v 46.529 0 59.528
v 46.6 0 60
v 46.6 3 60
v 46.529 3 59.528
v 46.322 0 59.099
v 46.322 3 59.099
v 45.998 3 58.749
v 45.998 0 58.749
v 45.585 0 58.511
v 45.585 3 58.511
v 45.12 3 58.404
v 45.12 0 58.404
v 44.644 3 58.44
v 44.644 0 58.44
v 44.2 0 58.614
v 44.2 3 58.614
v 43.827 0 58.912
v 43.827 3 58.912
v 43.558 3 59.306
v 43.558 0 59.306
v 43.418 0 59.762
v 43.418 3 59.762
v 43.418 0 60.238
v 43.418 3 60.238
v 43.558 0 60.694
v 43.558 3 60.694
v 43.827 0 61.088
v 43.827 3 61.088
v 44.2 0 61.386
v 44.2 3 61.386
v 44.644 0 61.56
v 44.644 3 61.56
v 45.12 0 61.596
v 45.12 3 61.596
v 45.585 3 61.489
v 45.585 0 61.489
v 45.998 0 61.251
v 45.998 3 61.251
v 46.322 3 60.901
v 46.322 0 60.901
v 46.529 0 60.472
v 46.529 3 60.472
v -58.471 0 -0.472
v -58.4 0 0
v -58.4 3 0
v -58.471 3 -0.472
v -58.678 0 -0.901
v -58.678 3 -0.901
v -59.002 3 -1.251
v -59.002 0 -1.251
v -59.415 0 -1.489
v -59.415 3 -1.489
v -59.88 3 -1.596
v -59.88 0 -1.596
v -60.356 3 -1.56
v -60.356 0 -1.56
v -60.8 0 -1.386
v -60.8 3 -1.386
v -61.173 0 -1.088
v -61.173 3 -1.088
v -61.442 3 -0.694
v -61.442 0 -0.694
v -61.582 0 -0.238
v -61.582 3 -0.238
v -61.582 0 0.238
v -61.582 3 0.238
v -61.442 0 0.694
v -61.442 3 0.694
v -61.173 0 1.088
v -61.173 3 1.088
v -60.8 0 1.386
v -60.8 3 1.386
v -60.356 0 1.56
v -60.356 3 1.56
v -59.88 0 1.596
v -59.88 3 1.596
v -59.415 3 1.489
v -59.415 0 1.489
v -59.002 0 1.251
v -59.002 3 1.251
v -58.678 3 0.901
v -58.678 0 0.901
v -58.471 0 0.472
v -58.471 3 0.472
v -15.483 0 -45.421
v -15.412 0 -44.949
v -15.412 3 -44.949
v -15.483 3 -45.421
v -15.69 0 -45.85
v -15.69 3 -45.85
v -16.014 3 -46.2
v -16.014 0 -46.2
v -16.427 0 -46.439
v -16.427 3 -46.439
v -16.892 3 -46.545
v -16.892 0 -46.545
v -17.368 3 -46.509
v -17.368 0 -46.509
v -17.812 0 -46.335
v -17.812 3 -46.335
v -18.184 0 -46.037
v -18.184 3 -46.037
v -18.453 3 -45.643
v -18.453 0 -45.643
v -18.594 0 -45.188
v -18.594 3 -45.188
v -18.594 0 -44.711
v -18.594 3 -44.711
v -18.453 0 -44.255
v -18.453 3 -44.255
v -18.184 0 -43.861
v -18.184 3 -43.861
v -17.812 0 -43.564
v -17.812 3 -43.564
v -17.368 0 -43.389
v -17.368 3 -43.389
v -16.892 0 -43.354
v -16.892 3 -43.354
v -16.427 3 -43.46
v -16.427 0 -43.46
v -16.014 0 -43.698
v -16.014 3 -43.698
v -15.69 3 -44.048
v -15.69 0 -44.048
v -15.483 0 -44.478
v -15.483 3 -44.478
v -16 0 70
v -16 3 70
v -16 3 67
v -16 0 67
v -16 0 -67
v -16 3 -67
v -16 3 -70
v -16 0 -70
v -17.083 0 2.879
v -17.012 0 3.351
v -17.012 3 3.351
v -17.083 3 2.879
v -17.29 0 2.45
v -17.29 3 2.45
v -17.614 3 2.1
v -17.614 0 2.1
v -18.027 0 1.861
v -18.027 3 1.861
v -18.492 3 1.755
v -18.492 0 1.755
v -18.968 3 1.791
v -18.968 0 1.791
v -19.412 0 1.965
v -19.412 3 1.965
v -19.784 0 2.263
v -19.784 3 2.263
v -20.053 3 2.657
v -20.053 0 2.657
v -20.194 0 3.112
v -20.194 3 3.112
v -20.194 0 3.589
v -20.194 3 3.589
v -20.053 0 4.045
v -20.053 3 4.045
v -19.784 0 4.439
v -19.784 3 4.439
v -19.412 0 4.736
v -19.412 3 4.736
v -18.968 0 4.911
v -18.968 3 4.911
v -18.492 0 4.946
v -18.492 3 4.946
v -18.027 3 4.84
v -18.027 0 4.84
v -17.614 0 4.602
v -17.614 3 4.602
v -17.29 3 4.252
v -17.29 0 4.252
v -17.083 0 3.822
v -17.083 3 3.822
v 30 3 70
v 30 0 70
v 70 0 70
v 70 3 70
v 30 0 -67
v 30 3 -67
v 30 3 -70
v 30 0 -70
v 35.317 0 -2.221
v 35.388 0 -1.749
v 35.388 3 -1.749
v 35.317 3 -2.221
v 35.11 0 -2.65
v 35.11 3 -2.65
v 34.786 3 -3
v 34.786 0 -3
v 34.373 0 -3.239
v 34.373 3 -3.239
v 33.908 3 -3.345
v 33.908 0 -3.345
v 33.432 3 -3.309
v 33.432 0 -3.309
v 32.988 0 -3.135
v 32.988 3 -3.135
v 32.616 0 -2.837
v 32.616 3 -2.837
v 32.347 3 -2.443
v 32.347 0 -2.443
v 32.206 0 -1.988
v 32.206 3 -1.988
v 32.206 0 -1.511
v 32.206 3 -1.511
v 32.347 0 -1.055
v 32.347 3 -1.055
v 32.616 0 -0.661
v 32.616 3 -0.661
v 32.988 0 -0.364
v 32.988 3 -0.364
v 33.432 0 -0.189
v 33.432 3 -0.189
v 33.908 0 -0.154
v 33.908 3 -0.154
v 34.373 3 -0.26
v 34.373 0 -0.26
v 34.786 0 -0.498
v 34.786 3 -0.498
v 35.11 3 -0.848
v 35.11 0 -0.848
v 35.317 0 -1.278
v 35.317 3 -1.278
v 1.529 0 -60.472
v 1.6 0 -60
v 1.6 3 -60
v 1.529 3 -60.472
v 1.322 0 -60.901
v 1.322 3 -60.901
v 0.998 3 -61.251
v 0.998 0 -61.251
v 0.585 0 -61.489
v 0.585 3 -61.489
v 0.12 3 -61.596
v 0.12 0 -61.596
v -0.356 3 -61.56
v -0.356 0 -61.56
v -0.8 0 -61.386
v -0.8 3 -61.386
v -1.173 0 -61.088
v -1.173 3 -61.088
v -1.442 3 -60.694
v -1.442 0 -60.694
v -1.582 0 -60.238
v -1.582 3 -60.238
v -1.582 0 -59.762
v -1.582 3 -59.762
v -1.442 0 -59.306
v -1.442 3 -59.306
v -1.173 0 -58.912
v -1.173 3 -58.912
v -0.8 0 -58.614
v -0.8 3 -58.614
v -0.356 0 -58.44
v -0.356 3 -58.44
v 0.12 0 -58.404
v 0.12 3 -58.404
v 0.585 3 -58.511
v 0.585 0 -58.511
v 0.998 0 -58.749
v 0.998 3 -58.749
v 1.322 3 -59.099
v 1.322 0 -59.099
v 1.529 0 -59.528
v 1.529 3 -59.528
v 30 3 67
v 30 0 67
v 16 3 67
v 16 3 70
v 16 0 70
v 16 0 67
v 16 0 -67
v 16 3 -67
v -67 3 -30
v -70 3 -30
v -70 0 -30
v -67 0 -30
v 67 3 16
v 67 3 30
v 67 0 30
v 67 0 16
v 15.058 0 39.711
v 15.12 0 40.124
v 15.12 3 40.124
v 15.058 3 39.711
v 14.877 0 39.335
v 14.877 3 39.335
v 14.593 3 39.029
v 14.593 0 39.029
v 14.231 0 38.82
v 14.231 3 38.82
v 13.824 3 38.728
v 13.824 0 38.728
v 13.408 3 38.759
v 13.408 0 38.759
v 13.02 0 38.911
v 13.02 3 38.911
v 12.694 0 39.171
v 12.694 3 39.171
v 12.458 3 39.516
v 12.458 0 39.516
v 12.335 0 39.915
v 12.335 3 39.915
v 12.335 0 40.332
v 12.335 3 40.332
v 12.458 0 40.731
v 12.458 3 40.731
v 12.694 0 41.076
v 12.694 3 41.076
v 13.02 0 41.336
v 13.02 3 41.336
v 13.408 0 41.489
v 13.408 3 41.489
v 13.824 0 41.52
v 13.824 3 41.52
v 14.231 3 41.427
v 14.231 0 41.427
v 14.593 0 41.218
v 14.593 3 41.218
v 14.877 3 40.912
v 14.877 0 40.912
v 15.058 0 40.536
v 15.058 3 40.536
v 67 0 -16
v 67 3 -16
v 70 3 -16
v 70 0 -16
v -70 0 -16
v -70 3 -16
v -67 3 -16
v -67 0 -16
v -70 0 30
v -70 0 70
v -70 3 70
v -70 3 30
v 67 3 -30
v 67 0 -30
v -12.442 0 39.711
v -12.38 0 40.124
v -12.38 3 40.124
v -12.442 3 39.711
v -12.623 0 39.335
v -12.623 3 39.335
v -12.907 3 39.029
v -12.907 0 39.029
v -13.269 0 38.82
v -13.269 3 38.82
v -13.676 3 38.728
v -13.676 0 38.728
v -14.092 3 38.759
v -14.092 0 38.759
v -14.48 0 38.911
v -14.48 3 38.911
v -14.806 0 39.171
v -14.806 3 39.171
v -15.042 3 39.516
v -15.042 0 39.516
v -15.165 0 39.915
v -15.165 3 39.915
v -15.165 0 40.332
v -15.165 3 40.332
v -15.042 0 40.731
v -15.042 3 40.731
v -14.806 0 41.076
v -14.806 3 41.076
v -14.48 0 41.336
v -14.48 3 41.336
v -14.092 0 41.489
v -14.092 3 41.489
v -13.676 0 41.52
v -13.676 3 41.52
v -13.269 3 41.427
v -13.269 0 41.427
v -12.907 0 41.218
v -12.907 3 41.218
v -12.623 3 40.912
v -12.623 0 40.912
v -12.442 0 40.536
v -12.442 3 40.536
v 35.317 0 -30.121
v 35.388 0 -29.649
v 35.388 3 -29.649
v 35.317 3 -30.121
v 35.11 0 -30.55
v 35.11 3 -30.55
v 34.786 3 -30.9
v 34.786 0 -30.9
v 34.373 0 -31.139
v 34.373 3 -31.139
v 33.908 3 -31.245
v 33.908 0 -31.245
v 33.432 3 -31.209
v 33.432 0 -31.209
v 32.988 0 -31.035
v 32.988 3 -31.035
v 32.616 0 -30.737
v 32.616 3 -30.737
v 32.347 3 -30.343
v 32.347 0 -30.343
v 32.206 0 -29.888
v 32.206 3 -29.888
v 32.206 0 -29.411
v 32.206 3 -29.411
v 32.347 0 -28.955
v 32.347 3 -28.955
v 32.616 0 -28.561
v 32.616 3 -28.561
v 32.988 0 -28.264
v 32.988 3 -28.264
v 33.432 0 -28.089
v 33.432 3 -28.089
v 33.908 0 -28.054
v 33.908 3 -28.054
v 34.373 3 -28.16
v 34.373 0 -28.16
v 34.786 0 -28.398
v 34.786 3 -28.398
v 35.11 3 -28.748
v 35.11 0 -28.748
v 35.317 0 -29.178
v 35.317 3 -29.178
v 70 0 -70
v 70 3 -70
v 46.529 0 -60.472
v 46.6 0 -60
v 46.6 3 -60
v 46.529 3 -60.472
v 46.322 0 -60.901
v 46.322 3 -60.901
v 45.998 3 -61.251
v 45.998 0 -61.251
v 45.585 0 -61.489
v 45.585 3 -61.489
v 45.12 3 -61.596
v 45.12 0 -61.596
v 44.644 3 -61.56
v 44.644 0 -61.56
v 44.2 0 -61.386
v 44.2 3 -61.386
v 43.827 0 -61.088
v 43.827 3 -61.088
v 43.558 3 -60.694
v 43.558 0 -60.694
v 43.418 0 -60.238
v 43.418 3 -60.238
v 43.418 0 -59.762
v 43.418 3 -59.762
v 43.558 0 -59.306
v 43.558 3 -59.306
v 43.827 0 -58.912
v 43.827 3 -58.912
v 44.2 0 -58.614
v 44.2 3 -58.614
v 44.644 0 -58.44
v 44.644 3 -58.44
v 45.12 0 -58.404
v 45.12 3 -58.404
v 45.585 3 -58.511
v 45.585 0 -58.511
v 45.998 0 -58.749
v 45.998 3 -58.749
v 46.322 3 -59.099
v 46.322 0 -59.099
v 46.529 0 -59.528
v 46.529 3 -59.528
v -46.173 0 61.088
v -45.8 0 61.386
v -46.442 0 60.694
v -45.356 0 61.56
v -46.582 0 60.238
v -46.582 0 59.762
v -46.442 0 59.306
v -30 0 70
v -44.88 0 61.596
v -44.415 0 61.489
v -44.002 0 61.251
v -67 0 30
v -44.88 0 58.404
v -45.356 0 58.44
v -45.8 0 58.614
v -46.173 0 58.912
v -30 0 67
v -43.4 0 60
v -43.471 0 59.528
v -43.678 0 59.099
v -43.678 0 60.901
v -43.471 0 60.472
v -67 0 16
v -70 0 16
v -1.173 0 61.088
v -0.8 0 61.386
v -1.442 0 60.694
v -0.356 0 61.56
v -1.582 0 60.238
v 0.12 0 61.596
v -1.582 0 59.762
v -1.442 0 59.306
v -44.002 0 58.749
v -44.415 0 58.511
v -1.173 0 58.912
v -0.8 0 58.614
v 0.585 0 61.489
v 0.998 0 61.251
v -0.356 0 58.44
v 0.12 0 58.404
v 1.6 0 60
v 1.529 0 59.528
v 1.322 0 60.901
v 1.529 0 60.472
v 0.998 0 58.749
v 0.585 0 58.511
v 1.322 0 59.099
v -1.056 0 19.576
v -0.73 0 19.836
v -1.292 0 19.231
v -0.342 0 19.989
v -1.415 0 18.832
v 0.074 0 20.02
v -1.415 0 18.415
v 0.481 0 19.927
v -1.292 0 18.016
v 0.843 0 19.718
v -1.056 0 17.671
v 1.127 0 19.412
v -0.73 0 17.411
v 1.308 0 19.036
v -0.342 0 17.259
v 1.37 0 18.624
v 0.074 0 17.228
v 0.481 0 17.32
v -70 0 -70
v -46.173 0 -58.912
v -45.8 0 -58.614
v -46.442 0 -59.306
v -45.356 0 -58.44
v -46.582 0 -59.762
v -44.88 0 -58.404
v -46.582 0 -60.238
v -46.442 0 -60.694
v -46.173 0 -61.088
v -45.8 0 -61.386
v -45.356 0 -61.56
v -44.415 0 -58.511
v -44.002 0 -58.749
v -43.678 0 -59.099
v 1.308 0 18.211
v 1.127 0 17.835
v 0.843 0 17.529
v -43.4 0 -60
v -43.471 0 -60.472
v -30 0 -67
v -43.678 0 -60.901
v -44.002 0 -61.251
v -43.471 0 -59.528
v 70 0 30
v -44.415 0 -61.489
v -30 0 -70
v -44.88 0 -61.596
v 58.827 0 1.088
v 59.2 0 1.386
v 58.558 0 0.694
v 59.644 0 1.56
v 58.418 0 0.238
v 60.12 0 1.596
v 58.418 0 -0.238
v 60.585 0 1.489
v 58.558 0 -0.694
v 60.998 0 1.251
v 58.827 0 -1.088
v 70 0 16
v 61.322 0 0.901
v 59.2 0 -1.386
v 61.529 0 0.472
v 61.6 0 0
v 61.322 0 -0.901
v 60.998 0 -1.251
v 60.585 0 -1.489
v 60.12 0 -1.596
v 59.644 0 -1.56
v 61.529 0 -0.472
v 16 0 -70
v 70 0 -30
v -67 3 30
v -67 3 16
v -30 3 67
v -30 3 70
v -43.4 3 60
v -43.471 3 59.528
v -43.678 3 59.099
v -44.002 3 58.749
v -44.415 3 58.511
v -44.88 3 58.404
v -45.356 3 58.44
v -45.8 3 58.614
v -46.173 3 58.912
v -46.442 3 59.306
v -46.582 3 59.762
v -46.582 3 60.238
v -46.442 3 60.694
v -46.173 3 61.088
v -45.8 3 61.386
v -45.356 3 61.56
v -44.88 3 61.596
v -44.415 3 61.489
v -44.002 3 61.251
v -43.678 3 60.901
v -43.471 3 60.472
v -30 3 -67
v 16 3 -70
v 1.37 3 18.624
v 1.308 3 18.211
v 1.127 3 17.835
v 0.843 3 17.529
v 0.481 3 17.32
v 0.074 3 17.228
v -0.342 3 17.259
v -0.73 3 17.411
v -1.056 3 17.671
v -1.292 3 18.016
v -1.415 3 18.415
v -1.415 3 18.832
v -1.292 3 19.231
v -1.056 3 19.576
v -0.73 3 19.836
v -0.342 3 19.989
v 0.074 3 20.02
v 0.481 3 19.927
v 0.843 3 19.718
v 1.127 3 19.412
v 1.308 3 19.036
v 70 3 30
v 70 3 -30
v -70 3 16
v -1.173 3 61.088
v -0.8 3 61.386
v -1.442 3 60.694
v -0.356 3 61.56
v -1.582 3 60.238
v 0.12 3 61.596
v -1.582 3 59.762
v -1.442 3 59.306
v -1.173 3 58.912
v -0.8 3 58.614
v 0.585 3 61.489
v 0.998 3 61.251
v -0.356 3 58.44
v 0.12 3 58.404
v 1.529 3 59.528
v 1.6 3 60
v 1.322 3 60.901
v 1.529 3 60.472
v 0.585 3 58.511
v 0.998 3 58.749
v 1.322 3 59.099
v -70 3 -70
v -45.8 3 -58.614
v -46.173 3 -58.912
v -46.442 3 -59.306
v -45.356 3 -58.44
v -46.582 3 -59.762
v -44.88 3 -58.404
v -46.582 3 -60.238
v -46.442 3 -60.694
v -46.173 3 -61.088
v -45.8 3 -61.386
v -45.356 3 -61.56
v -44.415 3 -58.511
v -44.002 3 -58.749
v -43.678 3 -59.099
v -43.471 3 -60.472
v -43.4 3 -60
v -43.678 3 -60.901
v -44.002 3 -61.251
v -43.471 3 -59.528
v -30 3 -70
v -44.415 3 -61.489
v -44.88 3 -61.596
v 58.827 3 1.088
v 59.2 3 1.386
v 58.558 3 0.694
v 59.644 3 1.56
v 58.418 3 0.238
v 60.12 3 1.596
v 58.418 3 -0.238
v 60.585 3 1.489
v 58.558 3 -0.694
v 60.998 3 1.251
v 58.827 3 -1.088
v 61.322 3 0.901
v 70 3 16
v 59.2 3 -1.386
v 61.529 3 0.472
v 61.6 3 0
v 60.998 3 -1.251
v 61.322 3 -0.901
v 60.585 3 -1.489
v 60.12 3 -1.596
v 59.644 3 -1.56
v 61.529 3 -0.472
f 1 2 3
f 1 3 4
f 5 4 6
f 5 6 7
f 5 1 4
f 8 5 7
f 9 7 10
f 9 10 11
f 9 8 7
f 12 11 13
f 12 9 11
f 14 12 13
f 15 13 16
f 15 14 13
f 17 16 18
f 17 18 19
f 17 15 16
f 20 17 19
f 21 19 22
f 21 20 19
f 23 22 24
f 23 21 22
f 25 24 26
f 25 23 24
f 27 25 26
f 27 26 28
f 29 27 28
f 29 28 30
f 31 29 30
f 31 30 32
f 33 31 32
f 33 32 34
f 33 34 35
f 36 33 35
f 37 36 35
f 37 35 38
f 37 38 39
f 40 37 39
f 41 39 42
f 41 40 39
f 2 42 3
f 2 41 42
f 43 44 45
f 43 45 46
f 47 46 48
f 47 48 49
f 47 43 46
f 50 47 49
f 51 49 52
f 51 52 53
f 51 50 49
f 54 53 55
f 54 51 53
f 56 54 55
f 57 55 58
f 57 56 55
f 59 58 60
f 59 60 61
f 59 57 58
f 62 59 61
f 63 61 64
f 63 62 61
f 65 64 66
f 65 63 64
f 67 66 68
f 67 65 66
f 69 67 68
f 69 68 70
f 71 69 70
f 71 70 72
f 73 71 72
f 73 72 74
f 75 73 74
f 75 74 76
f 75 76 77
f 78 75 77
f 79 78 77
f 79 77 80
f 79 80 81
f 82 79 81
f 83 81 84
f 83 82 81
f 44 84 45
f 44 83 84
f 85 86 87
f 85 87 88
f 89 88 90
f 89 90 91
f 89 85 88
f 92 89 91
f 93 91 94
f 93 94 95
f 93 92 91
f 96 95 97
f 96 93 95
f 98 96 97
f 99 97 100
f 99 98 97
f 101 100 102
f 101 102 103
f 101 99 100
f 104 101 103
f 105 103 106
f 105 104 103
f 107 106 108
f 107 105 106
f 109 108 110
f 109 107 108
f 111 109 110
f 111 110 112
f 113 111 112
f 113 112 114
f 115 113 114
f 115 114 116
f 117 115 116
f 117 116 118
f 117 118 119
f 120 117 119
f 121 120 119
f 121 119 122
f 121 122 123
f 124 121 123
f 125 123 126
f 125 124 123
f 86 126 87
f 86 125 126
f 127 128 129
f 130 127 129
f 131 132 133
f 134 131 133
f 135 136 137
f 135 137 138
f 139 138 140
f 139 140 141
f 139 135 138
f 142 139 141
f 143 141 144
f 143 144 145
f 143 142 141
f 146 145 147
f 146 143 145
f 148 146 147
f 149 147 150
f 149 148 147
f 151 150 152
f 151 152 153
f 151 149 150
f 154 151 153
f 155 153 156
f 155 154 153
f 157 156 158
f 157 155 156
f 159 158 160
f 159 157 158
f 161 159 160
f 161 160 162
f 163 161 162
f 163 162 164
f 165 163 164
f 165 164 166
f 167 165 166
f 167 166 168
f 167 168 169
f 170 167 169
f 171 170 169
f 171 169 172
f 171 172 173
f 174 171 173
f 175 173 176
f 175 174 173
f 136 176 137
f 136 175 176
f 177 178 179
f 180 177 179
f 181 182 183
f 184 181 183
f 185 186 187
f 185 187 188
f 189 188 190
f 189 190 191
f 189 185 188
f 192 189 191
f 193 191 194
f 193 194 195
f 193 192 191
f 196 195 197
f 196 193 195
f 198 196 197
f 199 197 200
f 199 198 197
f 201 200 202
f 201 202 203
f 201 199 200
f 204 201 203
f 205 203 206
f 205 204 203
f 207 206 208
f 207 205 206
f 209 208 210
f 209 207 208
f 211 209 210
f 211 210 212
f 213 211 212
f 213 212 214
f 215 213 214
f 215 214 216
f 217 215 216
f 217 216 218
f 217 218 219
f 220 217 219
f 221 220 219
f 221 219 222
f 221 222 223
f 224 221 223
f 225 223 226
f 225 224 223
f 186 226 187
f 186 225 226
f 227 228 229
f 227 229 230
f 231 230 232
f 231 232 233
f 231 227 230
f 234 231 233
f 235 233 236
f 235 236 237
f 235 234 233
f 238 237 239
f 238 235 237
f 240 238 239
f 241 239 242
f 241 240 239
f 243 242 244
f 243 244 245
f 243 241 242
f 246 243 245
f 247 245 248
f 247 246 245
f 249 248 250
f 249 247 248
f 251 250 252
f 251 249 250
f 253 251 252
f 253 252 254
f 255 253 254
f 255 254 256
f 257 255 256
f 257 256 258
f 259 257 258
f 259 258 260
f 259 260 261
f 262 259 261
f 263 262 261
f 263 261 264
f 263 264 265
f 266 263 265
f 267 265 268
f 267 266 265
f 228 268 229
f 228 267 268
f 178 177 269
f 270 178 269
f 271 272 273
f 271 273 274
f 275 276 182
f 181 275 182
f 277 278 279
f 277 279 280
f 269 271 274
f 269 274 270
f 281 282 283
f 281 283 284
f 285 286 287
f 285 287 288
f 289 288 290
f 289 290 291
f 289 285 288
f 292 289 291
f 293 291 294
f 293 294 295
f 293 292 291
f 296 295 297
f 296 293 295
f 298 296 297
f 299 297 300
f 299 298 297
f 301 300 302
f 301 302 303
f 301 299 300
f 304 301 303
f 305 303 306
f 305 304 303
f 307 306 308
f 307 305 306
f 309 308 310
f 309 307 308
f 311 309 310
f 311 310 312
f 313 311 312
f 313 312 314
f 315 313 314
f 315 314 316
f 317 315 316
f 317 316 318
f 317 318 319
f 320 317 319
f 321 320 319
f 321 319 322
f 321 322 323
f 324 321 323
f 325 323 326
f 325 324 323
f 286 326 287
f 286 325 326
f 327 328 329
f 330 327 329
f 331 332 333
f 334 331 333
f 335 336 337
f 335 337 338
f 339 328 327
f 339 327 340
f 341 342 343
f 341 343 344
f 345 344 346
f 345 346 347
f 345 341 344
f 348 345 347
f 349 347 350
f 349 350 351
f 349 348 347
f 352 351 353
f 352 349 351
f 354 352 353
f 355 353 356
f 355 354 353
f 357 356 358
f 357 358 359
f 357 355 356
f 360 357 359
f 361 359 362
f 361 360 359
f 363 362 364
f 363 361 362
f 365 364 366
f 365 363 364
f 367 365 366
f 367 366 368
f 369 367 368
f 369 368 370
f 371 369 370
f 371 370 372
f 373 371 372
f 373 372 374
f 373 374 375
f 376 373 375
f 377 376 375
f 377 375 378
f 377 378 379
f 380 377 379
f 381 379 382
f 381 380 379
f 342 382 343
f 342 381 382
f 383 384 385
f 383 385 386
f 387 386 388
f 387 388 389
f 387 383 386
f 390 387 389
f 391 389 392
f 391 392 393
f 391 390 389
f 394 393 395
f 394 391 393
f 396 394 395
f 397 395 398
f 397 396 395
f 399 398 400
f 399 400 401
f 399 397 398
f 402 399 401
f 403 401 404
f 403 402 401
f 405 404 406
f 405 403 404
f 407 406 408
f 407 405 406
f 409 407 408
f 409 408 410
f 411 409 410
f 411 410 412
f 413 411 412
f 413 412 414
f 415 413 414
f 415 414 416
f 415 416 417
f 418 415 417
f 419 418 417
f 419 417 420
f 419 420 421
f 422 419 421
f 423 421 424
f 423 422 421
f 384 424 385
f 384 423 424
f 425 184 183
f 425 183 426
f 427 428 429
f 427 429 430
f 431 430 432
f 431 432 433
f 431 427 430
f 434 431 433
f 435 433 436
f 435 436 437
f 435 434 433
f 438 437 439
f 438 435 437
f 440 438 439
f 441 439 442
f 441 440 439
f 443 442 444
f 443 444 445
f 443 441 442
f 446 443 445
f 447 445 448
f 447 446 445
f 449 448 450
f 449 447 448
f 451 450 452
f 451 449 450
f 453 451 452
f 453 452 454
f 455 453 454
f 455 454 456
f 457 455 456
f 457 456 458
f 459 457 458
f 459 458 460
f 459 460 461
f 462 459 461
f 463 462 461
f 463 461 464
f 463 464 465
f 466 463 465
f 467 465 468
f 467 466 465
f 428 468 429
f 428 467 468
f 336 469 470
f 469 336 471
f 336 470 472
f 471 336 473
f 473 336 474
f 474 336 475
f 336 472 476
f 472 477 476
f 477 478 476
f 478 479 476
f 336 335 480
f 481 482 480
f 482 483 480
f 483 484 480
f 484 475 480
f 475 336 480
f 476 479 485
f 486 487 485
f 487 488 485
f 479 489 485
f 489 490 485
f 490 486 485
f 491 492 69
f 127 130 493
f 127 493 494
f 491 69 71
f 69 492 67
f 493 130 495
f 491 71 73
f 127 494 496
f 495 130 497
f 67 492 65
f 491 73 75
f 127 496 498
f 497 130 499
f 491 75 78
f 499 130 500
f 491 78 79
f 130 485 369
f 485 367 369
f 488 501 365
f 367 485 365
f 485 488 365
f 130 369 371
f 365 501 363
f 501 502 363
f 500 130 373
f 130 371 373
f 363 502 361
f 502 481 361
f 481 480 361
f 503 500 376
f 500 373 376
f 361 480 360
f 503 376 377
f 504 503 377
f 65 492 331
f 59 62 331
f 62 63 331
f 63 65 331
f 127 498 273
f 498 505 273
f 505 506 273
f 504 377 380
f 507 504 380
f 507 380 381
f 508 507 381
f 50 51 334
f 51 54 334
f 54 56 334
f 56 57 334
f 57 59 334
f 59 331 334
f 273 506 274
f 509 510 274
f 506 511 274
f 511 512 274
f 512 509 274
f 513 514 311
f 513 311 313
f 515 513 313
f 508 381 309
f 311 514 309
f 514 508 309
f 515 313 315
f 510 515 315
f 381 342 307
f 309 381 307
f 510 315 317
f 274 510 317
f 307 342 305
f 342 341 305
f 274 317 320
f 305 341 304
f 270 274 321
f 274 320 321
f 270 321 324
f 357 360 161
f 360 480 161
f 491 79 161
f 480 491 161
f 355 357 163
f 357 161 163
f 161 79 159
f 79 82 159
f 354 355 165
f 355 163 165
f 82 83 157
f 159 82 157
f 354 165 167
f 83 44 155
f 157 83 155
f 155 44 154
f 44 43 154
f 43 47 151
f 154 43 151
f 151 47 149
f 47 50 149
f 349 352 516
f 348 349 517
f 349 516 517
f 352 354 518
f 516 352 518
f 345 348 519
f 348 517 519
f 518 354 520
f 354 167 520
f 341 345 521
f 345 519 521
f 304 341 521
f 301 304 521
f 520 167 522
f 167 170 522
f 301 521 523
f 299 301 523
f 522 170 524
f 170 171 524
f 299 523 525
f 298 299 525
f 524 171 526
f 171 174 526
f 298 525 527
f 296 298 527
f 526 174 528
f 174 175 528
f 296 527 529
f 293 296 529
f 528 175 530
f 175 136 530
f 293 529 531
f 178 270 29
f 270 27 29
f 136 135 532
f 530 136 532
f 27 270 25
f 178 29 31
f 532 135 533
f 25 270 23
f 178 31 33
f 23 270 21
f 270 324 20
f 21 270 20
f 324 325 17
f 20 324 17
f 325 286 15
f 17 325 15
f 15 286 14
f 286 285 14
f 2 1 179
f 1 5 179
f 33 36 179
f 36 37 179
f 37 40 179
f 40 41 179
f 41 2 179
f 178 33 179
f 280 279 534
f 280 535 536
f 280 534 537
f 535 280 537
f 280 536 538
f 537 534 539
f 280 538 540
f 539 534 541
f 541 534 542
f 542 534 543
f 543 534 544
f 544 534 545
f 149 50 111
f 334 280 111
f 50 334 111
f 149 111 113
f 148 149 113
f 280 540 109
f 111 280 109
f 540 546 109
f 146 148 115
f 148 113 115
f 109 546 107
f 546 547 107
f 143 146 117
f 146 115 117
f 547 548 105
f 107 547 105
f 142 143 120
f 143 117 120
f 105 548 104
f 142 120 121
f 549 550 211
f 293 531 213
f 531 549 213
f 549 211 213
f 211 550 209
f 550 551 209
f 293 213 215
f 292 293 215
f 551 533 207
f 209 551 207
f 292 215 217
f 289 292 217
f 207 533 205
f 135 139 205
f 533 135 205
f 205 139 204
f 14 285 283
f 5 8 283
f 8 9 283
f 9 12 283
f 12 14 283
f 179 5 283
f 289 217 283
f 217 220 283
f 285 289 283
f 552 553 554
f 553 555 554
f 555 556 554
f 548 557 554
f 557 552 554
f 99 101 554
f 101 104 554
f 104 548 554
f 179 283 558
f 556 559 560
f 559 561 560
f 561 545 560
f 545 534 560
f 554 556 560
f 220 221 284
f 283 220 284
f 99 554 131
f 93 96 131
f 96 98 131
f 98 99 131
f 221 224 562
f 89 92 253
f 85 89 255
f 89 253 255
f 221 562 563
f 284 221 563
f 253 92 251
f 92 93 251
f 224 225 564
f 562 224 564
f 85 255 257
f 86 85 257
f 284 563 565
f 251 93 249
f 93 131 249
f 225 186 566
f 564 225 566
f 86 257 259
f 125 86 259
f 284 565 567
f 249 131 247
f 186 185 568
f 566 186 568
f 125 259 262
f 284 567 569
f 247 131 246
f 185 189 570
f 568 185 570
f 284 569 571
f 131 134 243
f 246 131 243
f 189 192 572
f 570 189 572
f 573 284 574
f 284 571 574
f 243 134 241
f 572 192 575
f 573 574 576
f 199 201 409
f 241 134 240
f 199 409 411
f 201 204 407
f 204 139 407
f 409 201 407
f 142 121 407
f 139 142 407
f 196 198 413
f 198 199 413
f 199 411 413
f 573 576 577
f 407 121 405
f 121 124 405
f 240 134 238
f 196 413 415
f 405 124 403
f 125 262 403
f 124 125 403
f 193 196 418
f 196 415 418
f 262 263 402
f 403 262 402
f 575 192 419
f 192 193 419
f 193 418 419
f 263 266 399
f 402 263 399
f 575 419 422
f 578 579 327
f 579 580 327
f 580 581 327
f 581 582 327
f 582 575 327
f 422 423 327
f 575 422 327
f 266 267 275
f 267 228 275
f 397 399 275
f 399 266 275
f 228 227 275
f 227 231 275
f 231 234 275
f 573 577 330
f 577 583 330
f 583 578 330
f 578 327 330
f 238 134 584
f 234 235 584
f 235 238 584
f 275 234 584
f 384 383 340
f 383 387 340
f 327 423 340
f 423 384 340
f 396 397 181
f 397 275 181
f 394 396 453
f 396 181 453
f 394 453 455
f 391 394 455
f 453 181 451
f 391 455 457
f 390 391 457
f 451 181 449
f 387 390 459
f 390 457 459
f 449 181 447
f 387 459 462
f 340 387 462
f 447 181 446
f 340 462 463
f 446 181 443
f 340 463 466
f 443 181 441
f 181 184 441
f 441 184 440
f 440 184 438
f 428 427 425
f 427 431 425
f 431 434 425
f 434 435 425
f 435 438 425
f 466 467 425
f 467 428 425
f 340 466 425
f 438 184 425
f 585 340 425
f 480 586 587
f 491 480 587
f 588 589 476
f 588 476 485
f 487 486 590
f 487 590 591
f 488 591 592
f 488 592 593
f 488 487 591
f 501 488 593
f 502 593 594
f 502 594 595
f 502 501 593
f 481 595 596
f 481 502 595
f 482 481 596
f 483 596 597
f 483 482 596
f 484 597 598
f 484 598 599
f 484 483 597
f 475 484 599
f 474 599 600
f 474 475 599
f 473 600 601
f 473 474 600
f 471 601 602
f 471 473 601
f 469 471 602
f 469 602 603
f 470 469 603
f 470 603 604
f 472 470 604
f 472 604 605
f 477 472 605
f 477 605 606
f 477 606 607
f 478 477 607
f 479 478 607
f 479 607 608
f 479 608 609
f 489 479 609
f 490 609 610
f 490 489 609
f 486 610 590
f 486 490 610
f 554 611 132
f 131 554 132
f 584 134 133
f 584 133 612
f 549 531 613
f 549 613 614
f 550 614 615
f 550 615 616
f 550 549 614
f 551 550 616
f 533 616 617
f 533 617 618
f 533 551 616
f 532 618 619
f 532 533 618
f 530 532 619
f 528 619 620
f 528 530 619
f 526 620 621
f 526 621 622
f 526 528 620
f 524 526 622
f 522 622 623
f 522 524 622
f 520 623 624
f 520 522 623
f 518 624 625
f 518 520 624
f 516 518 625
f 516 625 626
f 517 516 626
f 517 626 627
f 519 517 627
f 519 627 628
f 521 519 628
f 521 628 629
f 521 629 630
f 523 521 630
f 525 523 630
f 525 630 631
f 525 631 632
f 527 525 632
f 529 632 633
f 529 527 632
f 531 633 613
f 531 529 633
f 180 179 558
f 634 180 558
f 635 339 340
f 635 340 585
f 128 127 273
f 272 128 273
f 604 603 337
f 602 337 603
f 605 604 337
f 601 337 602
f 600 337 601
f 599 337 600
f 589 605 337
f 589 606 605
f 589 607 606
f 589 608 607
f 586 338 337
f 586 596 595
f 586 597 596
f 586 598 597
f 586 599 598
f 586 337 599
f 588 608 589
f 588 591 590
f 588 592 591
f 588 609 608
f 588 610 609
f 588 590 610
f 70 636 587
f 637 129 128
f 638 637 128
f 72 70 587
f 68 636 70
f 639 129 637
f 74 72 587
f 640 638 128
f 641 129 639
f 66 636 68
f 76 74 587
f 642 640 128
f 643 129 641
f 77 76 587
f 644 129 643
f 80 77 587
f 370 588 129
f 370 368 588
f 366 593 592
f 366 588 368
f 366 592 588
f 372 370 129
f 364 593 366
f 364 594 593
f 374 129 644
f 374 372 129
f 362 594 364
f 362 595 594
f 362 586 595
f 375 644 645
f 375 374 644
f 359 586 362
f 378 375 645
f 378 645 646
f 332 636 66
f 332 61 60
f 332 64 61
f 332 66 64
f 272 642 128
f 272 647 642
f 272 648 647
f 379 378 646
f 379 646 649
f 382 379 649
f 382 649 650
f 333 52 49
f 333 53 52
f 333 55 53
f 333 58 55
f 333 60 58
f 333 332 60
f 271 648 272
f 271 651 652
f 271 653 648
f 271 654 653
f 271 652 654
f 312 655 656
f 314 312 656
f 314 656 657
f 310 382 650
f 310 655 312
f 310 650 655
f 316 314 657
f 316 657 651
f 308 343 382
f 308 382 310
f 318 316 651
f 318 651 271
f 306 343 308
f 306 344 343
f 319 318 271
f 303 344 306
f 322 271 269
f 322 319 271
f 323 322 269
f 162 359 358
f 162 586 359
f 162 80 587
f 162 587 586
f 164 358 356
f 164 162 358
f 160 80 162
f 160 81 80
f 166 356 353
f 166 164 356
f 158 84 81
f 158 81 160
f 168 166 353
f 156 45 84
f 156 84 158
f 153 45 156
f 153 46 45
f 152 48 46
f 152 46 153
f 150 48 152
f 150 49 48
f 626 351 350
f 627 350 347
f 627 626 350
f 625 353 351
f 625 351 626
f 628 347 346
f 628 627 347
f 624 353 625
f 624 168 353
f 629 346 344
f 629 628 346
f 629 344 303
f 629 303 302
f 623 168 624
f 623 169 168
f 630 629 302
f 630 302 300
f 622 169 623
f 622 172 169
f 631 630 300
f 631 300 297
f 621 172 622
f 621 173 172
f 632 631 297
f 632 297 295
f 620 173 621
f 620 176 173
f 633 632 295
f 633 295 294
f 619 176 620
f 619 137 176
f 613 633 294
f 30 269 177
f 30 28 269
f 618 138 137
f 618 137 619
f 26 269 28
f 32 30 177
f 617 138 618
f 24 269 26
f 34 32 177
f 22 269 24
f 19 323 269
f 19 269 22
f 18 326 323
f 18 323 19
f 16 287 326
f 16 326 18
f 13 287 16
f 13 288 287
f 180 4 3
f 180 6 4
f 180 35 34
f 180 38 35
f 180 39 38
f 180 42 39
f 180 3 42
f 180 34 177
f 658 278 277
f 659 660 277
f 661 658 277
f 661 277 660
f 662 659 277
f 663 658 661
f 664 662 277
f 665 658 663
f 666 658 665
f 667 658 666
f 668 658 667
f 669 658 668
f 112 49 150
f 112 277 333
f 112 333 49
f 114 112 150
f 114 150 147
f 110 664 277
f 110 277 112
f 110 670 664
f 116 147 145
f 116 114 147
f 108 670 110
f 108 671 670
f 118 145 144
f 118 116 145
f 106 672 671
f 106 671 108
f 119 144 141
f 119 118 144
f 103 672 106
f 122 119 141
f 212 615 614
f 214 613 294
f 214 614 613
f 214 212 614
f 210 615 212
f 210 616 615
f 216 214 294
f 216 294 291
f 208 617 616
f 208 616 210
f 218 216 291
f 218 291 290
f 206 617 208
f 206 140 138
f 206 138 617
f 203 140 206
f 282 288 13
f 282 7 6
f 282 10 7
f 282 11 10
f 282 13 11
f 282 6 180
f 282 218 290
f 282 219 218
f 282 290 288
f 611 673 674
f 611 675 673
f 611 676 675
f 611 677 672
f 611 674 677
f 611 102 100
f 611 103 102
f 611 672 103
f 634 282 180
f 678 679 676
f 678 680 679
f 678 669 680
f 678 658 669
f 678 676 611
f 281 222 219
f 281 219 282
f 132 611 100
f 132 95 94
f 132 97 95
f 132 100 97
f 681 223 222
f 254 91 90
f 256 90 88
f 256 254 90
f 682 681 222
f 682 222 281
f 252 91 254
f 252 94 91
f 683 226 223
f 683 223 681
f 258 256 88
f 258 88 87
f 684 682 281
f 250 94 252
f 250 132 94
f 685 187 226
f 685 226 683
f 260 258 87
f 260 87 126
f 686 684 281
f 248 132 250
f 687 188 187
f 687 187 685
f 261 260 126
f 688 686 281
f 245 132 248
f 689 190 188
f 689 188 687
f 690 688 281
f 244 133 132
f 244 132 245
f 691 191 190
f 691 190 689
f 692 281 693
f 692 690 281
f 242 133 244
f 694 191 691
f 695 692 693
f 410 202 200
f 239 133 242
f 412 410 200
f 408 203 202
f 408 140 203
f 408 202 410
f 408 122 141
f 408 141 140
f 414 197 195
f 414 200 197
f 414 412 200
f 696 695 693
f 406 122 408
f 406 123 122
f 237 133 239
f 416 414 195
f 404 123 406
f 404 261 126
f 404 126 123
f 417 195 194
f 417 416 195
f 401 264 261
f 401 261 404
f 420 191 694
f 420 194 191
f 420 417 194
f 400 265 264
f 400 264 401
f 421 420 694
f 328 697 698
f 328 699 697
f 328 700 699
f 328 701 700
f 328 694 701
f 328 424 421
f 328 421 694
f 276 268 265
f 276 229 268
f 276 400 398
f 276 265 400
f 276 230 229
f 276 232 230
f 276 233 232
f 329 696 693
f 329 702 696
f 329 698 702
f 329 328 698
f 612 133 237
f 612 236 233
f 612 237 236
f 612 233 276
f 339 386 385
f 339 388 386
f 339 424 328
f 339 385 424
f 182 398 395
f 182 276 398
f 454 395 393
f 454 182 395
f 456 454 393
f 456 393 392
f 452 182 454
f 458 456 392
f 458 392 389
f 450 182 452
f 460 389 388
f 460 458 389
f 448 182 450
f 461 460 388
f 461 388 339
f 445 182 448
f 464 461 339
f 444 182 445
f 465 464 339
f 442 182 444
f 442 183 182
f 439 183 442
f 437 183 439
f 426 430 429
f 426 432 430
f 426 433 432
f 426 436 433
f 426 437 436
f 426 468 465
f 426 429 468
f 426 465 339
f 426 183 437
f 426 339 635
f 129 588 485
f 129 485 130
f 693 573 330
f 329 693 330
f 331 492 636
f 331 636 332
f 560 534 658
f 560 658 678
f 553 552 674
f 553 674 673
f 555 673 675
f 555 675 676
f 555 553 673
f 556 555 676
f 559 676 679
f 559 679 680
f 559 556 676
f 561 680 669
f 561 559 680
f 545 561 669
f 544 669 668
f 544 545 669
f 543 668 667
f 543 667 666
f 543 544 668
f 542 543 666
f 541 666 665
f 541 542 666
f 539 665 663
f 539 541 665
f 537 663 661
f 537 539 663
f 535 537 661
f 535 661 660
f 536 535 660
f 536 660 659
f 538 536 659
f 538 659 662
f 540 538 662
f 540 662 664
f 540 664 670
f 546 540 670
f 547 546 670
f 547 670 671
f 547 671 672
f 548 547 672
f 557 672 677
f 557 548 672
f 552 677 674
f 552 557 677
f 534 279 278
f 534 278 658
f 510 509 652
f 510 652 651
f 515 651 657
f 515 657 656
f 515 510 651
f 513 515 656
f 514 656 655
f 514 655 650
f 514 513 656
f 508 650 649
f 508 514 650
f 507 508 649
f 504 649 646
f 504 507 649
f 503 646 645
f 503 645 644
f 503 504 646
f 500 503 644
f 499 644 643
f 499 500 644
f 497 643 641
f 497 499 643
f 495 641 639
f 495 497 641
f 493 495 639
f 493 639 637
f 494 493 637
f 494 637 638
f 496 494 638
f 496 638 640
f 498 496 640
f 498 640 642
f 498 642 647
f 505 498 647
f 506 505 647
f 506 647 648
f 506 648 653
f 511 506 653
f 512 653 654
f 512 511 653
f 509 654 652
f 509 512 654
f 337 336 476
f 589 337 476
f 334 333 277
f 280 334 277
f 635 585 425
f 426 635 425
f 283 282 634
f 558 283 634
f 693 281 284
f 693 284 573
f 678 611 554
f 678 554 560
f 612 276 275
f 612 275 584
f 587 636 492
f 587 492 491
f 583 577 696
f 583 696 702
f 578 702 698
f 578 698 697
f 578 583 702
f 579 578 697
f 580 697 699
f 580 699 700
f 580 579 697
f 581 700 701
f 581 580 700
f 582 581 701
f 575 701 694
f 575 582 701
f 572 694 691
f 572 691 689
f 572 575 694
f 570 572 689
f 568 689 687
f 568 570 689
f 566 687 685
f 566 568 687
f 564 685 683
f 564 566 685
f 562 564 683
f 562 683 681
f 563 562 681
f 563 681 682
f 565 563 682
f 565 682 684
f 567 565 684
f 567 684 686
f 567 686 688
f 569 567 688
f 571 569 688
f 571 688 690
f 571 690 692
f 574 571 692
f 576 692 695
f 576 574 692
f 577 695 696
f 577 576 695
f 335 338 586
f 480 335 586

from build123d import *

# Parameters (mm, degrees)
SKETCH2_W           = 140
SKETCH2_H           = 140
SKETCH2_R           = 1.6
SKETCH2_R_2         = 1.4
BOSS_EXTRUDE2_DEPTH = 3
SKETCH3_W           = 14
SKETCH3_H           = 3
SKETCH3_W_2         = 3
SKETCH3_H_2         = 14
CUT_EXTRUDE1_DEPTH  = 10


with BuildPart() as part:
    # Sketch2 → Boss-Extrude2 (new body)
    with BuildSketch(Plane(origin=(0, 0, 0), x_dir=(1, 0, 0), z_dir=(0, 1, 0))):
        Rectangle(SKETCH2_W, SKETCH2_H)
        with Locations((-17.011581703, 44.949159058)):
            Circle(SKETCH2_R, mode=Mode.SUBTRACT)
        with Locations((-18.611581703, -3.350840942)):
            Circle(SKETCH2_R, mode=Mode.SUBTRACT)
        with Locations((33.788418297, 29.649159058)):
            Circle(SKETCH2_R, mode=Mode.SUBTRACT)
        with Locations((33.788418297, 1.749159058)):
            Circle(SKETCH2_R, mode=Mode.SUBTRACT)
        with Locations((0, 60)):
            Circle(SKETCH2_R, mode=Mode.SUBTRACT)
        with Locations((-60, 0)):
            Circle(SKETCH2_R, mode=Mode.SUBTRACT)
        with Locations((0, -60)):
            Circle(SKETCH2_R, mode=Mode.SUBTRACT)
        with Locations((60, 0)):
            Circle(SKETCH2_R, mode=Mode.SUBTRACT)
        with Locations((-45, 60)):
            Circle(SKETCH2_R, mode=Mode.SUBTRACT)
        with Locations((45, 60)):
            Circle(SKETCH2_R, mode=Mode.SUBTRACT)
        with Locations((-45, -60)):
            Circle(SKETCH2_R, mode=Mode.SUBTRACT)
        with Locations((45, -60)):
            Circle(SKETCH2_R, mode=Mode.SUBTRACT)
        with Locations((-0.030225379, -18.62367845)):
            Circle(SKETCH2_R_2, mode=Mode.SUBTRACT)
        with Locations((-13.780225379, -40.12367845)):
            Circle(SKETCH2_R_2, mode=Mode.SUBTRACT)
        with Locations((13.719774621, -40.12367845)):
            Circle(SKETCH2_R_2, mode=Mode.SUBTRACT)
    extrude(amount=BOSS_EXTRUDE2_DEPTH)

    # Sketch3 → Cut-Extrude1 (cut)
    with BuildSketch(Plane(origin=(0, 3, 0), x_dir=(1, 0, 0), z_dir=(0, 1, 0))):
        with Locations((23, -68.5)):
            Rectangle(SKETCH3_W, SKETCH3_H)
        with Locations((23, 68.5)):
            Rectangle(SKETCH3_W, SKETCH3_H)
        with Locations((-23, 68.5)):
            Rectangle(SKETCH3_W, SKETCH3_H)
        with Locations((-23, -68.5)):
            Rectangle(SKETCH3_W, SKETCH3_H)
        with Locations((68.5, -23)):
            Rectangle(SKETCH3_W_2, SKETCH3_H_2)
        with Locations((68.5, 23)):
            Rectangle(SKETCH3_W_2, SKETCH3_H_2)
        with Locations((-68.5, 23)):
            Rectangle(SKETCH3_W_2, SKETCH3_H_2)
        with Locations((-68.5, -23)):
            Rectangle(SKETCH3_W_2, SKETCH3_H_2)
    extrude(amount=-CUT_EXTRUDE1_DEPTH, mode=Mode.SUBTRACT)


solid = part.part
